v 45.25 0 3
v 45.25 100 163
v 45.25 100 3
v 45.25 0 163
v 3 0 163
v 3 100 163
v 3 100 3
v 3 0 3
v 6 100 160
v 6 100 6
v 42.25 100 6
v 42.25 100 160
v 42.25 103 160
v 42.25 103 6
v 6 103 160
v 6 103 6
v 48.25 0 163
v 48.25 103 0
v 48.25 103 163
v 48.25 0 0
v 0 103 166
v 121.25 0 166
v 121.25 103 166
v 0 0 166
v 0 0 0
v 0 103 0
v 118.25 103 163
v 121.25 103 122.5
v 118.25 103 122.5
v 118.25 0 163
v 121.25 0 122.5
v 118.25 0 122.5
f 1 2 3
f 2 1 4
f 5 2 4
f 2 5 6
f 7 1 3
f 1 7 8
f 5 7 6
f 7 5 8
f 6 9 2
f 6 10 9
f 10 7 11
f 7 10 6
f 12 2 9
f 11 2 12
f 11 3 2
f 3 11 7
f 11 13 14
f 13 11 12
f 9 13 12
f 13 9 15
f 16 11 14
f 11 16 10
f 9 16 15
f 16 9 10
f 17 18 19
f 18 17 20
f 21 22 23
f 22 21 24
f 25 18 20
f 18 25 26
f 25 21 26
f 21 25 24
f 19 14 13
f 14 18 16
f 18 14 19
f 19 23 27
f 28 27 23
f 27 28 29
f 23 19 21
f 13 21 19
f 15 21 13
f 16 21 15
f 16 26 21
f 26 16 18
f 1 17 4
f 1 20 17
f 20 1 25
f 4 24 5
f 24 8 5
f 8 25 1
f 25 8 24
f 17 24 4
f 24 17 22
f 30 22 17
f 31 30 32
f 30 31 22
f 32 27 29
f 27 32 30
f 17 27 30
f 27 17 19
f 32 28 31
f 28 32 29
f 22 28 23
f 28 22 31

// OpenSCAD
$fn = 32;

th = 3;

kvm_dz = 160;
kvm_dy = 100;
kvm_dx = 42.25;

leg_width = 70;
leg_thickness = 40.5;
leg_weld_r = 4;
leg_support_dy = 150;
leg_support_dz = 50;

module leg() {
  // translate([0, 0, kvm_dz]) {
    // Horizontal
    translate([0, 0, -leg_thickness])
      cube([leg_width, 500, leg_thickness]);
    // Vertical
    translate([0, -0.1, -500])
      cube([leg_width, leg_thickness + 0.1, 500]);
    // Desk support
    translate([0, leg_support_dy, 0])
      cube([leg_width, leg_thickness, leg_support_dz]);
    // Weld
    translate([0, leg_thickness, -leg_thickness])
      rotate([0, 90, 0])
        cylinder(r=leg_weld_r, h=leg_width);
  // }
}

module kvm() {
  // KVM Body, overshoot by a tiny amount to render more cleanly
  translate([0, -0.1, 0])
    cube([kvm_dx, kvm_dy + 0.1, kvm_dz]);
  // KVM port clearance
  translate([th, kvm_dy - 0.1, th])
    cube([kvm_dx - th - th, 10, kvm_dz - th - th]);
}

module kvm_part() {
  difference() {
    cube([th + kvm_dx + th, kvm_dy + th, th + kvm_dz + th]);
    translate([th, 0, th])
      kvm();
  }
}

module leg_part() {
  difference() {
    union() {
      // Vertical back support
      // translate([0, leg_thickness, -kvm_dz - th])
      //   cube([th, th, kvm_dz - leg_thickness + th]);
      // Horizontal under support
      // translate([0, 0, -leg_thickness - th])
      //   cube([th, kvm_dy + th, th]);
      // Over-leg hanger
      translate([0, 0, -leg_thickness])
        cube([leg_width + th, kvm_dy + th, leg_thickness + th]);
    }
    leg();
  }
}

kvm_part();
translate([th + kvm_dx + th, 0, th + kvm_dz])
// leg();
leg_part();
